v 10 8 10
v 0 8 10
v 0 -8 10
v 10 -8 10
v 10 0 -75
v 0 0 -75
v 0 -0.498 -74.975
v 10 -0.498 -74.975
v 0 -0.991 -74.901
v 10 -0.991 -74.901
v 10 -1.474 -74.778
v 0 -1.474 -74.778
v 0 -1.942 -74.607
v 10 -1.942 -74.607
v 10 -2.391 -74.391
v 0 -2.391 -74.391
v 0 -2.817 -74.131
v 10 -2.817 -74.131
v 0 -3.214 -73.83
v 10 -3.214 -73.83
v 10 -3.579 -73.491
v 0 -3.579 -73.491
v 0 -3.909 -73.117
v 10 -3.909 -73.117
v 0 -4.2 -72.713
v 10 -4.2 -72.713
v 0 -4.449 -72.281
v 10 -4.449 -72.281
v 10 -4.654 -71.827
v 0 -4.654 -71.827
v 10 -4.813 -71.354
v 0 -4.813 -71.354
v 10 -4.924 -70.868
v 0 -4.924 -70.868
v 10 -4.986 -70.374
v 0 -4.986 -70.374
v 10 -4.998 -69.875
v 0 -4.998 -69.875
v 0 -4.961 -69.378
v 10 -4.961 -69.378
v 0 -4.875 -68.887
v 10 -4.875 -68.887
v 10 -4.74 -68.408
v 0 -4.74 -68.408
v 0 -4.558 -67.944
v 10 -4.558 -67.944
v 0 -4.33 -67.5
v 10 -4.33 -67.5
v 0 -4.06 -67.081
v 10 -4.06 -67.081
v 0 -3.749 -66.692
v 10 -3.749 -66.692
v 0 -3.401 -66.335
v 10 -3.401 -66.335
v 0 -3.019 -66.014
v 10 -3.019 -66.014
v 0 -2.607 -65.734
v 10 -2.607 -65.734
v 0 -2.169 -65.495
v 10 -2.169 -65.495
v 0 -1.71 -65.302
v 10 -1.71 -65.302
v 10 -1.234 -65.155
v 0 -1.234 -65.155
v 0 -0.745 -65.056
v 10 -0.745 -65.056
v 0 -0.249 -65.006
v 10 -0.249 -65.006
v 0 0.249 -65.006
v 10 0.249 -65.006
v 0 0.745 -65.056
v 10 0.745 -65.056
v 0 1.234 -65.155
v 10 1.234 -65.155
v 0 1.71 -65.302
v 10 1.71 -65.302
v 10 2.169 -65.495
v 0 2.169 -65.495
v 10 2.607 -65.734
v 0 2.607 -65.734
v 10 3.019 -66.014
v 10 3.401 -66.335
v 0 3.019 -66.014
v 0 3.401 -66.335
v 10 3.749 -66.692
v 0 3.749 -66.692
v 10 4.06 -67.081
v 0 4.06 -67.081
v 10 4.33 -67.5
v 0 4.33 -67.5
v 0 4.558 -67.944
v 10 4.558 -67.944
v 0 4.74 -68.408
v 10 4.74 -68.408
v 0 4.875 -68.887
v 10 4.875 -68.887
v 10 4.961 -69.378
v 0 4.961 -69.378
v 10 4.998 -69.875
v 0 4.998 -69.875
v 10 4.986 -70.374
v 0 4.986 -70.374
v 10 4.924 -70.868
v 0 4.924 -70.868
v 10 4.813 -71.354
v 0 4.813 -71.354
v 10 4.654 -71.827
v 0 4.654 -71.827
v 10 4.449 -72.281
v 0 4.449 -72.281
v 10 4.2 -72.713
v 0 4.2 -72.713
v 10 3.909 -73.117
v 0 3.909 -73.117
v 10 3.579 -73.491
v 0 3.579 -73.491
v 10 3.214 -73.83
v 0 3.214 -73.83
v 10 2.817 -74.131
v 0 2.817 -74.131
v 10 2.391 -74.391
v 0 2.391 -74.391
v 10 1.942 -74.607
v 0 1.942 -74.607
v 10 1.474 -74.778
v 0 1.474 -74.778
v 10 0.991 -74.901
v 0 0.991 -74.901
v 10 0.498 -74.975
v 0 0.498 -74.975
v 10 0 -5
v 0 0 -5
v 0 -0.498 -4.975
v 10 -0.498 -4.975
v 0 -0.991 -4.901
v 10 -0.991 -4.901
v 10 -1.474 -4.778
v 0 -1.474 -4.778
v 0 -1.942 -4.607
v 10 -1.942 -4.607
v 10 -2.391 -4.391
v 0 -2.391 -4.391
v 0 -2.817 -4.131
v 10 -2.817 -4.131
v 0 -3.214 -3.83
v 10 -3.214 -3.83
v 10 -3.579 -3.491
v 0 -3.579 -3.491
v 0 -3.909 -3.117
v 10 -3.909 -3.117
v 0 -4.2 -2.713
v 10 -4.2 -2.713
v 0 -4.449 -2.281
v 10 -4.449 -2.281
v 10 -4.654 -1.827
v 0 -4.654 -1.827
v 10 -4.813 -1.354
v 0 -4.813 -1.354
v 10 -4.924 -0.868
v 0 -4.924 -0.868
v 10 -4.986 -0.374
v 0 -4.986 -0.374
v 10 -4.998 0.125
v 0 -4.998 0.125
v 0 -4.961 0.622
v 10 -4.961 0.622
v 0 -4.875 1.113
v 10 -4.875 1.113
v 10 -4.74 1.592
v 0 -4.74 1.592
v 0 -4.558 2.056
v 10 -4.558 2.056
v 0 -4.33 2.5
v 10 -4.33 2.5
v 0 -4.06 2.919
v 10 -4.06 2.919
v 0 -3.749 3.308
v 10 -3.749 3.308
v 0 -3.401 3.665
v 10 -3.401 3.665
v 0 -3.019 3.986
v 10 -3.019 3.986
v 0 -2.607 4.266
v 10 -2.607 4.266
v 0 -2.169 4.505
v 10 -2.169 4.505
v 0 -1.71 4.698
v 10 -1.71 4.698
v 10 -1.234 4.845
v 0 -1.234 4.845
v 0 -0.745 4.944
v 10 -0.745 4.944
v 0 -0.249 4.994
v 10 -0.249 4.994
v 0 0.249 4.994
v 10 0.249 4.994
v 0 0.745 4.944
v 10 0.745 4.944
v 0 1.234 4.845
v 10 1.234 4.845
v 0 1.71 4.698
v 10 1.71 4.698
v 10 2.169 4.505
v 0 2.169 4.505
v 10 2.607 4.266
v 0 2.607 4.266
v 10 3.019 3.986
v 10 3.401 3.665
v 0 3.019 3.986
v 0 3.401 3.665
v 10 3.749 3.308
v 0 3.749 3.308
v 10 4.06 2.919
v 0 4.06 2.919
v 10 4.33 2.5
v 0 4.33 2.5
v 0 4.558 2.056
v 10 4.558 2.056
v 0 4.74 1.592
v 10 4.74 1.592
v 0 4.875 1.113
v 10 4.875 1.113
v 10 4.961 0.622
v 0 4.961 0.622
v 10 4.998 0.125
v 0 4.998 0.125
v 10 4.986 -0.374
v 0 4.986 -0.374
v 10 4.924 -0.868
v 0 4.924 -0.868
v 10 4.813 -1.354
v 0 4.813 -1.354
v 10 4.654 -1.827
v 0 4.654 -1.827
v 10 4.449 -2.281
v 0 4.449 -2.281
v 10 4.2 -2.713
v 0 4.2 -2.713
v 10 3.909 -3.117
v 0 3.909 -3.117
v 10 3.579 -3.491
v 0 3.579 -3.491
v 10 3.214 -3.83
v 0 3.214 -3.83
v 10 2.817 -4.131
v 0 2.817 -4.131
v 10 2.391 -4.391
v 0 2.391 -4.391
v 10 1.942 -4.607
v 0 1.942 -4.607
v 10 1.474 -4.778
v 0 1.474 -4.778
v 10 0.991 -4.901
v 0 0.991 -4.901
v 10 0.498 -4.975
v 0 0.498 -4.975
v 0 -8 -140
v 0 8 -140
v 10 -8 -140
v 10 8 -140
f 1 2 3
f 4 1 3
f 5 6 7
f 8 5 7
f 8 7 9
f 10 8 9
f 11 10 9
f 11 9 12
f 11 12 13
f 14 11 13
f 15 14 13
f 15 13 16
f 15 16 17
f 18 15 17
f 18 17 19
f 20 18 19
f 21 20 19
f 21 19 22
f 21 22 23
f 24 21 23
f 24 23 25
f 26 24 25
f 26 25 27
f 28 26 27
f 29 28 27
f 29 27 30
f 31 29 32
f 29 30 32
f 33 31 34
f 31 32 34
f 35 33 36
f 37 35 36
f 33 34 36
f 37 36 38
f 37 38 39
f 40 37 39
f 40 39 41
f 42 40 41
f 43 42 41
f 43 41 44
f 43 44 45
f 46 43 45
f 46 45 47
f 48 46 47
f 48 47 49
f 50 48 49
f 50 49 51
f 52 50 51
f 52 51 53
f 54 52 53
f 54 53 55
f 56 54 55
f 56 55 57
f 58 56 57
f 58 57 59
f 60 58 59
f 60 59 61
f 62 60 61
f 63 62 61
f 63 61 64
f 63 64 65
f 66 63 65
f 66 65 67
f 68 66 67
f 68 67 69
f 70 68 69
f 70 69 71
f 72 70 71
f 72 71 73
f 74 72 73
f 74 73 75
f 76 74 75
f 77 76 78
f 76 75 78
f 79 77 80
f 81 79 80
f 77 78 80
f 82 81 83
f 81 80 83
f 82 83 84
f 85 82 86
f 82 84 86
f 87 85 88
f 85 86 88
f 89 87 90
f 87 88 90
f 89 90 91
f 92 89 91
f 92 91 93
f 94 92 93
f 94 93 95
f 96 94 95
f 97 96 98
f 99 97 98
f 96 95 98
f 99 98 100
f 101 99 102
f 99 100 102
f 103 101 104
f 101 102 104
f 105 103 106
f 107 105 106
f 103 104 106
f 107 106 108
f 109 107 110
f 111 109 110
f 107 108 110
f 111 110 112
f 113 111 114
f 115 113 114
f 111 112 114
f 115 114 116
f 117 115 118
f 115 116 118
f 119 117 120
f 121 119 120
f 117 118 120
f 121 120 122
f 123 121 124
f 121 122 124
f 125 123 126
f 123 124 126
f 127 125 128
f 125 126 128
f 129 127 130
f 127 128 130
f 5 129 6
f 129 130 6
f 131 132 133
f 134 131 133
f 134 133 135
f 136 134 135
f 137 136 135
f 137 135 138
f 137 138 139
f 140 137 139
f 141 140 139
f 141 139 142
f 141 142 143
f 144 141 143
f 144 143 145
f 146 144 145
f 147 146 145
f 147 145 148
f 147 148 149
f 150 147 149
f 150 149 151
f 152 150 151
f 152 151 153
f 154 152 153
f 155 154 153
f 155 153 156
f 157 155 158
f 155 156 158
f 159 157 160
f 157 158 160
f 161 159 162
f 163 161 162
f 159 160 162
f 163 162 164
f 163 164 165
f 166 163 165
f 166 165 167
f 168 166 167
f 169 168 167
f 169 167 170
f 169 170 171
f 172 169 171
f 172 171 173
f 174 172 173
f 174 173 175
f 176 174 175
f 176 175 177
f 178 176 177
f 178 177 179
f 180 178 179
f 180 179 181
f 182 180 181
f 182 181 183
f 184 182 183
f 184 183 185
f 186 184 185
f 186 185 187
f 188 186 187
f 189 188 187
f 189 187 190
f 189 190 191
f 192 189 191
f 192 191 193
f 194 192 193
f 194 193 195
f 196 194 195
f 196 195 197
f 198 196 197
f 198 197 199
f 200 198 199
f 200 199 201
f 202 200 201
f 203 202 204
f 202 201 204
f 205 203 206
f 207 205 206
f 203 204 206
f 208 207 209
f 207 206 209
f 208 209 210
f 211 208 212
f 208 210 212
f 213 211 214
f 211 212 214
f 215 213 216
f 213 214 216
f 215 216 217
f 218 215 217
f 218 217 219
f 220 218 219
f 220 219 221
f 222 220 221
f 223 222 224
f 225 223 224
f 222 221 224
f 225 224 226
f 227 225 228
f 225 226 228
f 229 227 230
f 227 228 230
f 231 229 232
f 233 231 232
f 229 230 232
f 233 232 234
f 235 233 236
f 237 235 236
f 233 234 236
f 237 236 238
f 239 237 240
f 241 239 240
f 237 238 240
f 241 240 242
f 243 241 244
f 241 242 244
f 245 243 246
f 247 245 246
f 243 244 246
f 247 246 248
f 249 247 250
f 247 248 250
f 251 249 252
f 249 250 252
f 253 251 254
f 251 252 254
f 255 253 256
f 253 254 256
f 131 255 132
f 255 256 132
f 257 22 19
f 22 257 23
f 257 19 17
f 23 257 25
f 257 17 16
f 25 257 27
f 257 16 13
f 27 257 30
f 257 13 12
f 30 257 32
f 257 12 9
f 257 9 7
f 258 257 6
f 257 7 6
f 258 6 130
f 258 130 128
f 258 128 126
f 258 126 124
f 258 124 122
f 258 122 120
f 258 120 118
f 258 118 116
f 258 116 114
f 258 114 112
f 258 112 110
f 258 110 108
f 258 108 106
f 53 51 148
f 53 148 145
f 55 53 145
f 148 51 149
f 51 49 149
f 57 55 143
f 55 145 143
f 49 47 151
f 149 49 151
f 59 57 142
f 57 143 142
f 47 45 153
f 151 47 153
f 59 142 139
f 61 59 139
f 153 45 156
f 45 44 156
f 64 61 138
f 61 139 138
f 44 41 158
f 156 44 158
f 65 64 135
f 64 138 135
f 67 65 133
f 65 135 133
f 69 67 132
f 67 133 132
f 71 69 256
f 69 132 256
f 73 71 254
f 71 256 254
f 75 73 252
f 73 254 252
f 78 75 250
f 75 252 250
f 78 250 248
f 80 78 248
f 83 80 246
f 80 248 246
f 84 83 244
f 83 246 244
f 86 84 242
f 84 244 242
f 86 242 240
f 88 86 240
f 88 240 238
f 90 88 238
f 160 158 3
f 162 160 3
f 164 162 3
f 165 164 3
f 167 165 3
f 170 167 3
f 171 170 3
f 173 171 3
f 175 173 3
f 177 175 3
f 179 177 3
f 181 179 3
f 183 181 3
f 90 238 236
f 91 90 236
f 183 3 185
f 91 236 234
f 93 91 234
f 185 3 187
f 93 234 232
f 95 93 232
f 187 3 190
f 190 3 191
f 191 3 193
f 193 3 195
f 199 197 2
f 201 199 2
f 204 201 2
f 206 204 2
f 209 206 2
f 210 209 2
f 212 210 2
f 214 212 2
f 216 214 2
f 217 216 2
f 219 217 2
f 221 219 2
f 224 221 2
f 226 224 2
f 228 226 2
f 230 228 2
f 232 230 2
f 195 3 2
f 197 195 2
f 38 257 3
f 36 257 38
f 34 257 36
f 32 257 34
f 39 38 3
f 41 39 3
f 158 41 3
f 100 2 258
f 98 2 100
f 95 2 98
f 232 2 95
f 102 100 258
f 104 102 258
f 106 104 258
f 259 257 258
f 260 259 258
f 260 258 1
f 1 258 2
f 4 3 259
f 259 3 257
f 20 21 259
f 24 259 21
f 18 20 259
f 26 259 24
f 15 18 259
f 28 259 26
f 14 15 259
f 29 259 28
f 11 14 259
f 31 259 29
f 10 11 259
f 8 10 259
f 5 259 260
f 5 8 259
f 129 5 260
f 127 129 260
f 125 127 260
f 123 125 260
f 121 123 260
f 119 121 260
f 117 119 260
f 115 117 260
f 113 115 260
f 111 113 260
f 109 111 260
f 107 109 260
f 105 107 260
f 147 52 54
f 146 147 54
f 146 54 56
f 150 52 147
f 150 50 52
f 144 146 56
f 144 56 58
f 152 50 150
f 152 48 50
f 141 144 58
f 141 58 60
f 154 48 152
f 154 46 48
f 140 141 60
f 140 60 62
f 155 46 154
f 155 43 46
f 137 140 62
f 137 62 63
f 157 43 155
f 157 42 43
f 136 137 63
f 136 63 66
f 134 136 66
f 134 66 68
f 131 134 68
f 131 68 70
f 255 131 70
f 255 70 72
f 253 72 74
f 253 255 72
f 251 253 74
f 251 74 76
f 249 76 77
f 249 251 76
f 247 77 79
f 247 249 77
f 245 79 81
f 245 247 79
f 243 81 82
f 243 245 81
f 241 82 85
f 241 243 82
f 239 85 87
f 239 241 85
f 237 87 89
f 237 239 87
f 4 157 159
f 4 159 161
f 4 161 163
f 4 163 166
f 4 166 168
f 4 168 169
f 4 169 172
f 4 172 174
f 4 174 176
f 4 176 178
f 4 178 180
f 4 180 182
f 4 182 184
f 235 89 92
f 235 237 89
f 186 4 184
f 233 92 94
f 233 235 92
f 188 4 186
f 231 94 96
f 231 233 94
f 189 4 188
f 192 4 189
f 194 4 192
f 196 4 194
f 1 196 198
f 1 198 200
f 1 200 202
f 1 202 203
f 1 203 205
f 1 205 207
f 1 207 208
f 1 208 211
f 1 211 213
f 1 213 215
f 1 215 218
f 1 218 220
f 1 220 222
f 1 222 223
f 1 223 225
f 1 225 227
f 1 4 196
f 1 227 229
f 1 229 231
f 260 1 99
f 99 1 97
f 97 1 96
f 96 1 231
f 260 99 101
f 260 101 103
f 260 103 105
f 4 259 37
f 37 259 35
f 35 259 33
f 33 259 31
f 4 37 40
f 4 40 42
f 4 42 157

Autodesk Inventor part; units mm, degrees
ref_plane "YZ Plane" through (0, 0, 0) normal (1, 0, 0) x (0, 1, 0)
ref_plane "XZ Plane" through (0, 0, 0) normal (0, 1, 0) x (-1, 0, 0)
ref_plane "XY Plane" through (0, 0, 0) normal (0, 0, 1) x (1, 0, 0)
sketch "Sketch1" plane through (0, 0, 0) normal (1, 0, 0) x (0, 1, 0)
  line L0 (8, 10) -> (-8, 10)
  line L1 (-8, 10) -> (-8, -140)
  line L2 (-8, -140) -> (8, -140)
  line L3 (8, -140) -> (8, 10)
  point P0 (0, 0)
  dimension "d0" = 16
  dimension "d1" = 8
  dimension "d2" = 10
  dimension "d3" = 150
extrude "Extrusion1" add sketch "Sketch1" along normal blind 10
sketch "Sketch2" plane through (10, 0, 0) normal (1, 0, 0) x (0, 0, -1)
  point P0 (0, 0)
  point P1 (0, 0)
hole "Hole1" at (10, 0, 0) direction (-1, 0, 0) diameter 10 depth 22 tip angle 118
sketch "Sketch3" plane through (10, 0, 0) normal (1, 0, 0) x (0, 0, -1)
  point P0 (0, 0)
  point P1 (70, 0)
  dimension "d20" = 0
  dimension "d21" = 70
hole "Hole2" at (10, 0, -70) direction (-1, 0, 0) diameter 10 depth 22 tip angle 118
properties part number "Haste"
